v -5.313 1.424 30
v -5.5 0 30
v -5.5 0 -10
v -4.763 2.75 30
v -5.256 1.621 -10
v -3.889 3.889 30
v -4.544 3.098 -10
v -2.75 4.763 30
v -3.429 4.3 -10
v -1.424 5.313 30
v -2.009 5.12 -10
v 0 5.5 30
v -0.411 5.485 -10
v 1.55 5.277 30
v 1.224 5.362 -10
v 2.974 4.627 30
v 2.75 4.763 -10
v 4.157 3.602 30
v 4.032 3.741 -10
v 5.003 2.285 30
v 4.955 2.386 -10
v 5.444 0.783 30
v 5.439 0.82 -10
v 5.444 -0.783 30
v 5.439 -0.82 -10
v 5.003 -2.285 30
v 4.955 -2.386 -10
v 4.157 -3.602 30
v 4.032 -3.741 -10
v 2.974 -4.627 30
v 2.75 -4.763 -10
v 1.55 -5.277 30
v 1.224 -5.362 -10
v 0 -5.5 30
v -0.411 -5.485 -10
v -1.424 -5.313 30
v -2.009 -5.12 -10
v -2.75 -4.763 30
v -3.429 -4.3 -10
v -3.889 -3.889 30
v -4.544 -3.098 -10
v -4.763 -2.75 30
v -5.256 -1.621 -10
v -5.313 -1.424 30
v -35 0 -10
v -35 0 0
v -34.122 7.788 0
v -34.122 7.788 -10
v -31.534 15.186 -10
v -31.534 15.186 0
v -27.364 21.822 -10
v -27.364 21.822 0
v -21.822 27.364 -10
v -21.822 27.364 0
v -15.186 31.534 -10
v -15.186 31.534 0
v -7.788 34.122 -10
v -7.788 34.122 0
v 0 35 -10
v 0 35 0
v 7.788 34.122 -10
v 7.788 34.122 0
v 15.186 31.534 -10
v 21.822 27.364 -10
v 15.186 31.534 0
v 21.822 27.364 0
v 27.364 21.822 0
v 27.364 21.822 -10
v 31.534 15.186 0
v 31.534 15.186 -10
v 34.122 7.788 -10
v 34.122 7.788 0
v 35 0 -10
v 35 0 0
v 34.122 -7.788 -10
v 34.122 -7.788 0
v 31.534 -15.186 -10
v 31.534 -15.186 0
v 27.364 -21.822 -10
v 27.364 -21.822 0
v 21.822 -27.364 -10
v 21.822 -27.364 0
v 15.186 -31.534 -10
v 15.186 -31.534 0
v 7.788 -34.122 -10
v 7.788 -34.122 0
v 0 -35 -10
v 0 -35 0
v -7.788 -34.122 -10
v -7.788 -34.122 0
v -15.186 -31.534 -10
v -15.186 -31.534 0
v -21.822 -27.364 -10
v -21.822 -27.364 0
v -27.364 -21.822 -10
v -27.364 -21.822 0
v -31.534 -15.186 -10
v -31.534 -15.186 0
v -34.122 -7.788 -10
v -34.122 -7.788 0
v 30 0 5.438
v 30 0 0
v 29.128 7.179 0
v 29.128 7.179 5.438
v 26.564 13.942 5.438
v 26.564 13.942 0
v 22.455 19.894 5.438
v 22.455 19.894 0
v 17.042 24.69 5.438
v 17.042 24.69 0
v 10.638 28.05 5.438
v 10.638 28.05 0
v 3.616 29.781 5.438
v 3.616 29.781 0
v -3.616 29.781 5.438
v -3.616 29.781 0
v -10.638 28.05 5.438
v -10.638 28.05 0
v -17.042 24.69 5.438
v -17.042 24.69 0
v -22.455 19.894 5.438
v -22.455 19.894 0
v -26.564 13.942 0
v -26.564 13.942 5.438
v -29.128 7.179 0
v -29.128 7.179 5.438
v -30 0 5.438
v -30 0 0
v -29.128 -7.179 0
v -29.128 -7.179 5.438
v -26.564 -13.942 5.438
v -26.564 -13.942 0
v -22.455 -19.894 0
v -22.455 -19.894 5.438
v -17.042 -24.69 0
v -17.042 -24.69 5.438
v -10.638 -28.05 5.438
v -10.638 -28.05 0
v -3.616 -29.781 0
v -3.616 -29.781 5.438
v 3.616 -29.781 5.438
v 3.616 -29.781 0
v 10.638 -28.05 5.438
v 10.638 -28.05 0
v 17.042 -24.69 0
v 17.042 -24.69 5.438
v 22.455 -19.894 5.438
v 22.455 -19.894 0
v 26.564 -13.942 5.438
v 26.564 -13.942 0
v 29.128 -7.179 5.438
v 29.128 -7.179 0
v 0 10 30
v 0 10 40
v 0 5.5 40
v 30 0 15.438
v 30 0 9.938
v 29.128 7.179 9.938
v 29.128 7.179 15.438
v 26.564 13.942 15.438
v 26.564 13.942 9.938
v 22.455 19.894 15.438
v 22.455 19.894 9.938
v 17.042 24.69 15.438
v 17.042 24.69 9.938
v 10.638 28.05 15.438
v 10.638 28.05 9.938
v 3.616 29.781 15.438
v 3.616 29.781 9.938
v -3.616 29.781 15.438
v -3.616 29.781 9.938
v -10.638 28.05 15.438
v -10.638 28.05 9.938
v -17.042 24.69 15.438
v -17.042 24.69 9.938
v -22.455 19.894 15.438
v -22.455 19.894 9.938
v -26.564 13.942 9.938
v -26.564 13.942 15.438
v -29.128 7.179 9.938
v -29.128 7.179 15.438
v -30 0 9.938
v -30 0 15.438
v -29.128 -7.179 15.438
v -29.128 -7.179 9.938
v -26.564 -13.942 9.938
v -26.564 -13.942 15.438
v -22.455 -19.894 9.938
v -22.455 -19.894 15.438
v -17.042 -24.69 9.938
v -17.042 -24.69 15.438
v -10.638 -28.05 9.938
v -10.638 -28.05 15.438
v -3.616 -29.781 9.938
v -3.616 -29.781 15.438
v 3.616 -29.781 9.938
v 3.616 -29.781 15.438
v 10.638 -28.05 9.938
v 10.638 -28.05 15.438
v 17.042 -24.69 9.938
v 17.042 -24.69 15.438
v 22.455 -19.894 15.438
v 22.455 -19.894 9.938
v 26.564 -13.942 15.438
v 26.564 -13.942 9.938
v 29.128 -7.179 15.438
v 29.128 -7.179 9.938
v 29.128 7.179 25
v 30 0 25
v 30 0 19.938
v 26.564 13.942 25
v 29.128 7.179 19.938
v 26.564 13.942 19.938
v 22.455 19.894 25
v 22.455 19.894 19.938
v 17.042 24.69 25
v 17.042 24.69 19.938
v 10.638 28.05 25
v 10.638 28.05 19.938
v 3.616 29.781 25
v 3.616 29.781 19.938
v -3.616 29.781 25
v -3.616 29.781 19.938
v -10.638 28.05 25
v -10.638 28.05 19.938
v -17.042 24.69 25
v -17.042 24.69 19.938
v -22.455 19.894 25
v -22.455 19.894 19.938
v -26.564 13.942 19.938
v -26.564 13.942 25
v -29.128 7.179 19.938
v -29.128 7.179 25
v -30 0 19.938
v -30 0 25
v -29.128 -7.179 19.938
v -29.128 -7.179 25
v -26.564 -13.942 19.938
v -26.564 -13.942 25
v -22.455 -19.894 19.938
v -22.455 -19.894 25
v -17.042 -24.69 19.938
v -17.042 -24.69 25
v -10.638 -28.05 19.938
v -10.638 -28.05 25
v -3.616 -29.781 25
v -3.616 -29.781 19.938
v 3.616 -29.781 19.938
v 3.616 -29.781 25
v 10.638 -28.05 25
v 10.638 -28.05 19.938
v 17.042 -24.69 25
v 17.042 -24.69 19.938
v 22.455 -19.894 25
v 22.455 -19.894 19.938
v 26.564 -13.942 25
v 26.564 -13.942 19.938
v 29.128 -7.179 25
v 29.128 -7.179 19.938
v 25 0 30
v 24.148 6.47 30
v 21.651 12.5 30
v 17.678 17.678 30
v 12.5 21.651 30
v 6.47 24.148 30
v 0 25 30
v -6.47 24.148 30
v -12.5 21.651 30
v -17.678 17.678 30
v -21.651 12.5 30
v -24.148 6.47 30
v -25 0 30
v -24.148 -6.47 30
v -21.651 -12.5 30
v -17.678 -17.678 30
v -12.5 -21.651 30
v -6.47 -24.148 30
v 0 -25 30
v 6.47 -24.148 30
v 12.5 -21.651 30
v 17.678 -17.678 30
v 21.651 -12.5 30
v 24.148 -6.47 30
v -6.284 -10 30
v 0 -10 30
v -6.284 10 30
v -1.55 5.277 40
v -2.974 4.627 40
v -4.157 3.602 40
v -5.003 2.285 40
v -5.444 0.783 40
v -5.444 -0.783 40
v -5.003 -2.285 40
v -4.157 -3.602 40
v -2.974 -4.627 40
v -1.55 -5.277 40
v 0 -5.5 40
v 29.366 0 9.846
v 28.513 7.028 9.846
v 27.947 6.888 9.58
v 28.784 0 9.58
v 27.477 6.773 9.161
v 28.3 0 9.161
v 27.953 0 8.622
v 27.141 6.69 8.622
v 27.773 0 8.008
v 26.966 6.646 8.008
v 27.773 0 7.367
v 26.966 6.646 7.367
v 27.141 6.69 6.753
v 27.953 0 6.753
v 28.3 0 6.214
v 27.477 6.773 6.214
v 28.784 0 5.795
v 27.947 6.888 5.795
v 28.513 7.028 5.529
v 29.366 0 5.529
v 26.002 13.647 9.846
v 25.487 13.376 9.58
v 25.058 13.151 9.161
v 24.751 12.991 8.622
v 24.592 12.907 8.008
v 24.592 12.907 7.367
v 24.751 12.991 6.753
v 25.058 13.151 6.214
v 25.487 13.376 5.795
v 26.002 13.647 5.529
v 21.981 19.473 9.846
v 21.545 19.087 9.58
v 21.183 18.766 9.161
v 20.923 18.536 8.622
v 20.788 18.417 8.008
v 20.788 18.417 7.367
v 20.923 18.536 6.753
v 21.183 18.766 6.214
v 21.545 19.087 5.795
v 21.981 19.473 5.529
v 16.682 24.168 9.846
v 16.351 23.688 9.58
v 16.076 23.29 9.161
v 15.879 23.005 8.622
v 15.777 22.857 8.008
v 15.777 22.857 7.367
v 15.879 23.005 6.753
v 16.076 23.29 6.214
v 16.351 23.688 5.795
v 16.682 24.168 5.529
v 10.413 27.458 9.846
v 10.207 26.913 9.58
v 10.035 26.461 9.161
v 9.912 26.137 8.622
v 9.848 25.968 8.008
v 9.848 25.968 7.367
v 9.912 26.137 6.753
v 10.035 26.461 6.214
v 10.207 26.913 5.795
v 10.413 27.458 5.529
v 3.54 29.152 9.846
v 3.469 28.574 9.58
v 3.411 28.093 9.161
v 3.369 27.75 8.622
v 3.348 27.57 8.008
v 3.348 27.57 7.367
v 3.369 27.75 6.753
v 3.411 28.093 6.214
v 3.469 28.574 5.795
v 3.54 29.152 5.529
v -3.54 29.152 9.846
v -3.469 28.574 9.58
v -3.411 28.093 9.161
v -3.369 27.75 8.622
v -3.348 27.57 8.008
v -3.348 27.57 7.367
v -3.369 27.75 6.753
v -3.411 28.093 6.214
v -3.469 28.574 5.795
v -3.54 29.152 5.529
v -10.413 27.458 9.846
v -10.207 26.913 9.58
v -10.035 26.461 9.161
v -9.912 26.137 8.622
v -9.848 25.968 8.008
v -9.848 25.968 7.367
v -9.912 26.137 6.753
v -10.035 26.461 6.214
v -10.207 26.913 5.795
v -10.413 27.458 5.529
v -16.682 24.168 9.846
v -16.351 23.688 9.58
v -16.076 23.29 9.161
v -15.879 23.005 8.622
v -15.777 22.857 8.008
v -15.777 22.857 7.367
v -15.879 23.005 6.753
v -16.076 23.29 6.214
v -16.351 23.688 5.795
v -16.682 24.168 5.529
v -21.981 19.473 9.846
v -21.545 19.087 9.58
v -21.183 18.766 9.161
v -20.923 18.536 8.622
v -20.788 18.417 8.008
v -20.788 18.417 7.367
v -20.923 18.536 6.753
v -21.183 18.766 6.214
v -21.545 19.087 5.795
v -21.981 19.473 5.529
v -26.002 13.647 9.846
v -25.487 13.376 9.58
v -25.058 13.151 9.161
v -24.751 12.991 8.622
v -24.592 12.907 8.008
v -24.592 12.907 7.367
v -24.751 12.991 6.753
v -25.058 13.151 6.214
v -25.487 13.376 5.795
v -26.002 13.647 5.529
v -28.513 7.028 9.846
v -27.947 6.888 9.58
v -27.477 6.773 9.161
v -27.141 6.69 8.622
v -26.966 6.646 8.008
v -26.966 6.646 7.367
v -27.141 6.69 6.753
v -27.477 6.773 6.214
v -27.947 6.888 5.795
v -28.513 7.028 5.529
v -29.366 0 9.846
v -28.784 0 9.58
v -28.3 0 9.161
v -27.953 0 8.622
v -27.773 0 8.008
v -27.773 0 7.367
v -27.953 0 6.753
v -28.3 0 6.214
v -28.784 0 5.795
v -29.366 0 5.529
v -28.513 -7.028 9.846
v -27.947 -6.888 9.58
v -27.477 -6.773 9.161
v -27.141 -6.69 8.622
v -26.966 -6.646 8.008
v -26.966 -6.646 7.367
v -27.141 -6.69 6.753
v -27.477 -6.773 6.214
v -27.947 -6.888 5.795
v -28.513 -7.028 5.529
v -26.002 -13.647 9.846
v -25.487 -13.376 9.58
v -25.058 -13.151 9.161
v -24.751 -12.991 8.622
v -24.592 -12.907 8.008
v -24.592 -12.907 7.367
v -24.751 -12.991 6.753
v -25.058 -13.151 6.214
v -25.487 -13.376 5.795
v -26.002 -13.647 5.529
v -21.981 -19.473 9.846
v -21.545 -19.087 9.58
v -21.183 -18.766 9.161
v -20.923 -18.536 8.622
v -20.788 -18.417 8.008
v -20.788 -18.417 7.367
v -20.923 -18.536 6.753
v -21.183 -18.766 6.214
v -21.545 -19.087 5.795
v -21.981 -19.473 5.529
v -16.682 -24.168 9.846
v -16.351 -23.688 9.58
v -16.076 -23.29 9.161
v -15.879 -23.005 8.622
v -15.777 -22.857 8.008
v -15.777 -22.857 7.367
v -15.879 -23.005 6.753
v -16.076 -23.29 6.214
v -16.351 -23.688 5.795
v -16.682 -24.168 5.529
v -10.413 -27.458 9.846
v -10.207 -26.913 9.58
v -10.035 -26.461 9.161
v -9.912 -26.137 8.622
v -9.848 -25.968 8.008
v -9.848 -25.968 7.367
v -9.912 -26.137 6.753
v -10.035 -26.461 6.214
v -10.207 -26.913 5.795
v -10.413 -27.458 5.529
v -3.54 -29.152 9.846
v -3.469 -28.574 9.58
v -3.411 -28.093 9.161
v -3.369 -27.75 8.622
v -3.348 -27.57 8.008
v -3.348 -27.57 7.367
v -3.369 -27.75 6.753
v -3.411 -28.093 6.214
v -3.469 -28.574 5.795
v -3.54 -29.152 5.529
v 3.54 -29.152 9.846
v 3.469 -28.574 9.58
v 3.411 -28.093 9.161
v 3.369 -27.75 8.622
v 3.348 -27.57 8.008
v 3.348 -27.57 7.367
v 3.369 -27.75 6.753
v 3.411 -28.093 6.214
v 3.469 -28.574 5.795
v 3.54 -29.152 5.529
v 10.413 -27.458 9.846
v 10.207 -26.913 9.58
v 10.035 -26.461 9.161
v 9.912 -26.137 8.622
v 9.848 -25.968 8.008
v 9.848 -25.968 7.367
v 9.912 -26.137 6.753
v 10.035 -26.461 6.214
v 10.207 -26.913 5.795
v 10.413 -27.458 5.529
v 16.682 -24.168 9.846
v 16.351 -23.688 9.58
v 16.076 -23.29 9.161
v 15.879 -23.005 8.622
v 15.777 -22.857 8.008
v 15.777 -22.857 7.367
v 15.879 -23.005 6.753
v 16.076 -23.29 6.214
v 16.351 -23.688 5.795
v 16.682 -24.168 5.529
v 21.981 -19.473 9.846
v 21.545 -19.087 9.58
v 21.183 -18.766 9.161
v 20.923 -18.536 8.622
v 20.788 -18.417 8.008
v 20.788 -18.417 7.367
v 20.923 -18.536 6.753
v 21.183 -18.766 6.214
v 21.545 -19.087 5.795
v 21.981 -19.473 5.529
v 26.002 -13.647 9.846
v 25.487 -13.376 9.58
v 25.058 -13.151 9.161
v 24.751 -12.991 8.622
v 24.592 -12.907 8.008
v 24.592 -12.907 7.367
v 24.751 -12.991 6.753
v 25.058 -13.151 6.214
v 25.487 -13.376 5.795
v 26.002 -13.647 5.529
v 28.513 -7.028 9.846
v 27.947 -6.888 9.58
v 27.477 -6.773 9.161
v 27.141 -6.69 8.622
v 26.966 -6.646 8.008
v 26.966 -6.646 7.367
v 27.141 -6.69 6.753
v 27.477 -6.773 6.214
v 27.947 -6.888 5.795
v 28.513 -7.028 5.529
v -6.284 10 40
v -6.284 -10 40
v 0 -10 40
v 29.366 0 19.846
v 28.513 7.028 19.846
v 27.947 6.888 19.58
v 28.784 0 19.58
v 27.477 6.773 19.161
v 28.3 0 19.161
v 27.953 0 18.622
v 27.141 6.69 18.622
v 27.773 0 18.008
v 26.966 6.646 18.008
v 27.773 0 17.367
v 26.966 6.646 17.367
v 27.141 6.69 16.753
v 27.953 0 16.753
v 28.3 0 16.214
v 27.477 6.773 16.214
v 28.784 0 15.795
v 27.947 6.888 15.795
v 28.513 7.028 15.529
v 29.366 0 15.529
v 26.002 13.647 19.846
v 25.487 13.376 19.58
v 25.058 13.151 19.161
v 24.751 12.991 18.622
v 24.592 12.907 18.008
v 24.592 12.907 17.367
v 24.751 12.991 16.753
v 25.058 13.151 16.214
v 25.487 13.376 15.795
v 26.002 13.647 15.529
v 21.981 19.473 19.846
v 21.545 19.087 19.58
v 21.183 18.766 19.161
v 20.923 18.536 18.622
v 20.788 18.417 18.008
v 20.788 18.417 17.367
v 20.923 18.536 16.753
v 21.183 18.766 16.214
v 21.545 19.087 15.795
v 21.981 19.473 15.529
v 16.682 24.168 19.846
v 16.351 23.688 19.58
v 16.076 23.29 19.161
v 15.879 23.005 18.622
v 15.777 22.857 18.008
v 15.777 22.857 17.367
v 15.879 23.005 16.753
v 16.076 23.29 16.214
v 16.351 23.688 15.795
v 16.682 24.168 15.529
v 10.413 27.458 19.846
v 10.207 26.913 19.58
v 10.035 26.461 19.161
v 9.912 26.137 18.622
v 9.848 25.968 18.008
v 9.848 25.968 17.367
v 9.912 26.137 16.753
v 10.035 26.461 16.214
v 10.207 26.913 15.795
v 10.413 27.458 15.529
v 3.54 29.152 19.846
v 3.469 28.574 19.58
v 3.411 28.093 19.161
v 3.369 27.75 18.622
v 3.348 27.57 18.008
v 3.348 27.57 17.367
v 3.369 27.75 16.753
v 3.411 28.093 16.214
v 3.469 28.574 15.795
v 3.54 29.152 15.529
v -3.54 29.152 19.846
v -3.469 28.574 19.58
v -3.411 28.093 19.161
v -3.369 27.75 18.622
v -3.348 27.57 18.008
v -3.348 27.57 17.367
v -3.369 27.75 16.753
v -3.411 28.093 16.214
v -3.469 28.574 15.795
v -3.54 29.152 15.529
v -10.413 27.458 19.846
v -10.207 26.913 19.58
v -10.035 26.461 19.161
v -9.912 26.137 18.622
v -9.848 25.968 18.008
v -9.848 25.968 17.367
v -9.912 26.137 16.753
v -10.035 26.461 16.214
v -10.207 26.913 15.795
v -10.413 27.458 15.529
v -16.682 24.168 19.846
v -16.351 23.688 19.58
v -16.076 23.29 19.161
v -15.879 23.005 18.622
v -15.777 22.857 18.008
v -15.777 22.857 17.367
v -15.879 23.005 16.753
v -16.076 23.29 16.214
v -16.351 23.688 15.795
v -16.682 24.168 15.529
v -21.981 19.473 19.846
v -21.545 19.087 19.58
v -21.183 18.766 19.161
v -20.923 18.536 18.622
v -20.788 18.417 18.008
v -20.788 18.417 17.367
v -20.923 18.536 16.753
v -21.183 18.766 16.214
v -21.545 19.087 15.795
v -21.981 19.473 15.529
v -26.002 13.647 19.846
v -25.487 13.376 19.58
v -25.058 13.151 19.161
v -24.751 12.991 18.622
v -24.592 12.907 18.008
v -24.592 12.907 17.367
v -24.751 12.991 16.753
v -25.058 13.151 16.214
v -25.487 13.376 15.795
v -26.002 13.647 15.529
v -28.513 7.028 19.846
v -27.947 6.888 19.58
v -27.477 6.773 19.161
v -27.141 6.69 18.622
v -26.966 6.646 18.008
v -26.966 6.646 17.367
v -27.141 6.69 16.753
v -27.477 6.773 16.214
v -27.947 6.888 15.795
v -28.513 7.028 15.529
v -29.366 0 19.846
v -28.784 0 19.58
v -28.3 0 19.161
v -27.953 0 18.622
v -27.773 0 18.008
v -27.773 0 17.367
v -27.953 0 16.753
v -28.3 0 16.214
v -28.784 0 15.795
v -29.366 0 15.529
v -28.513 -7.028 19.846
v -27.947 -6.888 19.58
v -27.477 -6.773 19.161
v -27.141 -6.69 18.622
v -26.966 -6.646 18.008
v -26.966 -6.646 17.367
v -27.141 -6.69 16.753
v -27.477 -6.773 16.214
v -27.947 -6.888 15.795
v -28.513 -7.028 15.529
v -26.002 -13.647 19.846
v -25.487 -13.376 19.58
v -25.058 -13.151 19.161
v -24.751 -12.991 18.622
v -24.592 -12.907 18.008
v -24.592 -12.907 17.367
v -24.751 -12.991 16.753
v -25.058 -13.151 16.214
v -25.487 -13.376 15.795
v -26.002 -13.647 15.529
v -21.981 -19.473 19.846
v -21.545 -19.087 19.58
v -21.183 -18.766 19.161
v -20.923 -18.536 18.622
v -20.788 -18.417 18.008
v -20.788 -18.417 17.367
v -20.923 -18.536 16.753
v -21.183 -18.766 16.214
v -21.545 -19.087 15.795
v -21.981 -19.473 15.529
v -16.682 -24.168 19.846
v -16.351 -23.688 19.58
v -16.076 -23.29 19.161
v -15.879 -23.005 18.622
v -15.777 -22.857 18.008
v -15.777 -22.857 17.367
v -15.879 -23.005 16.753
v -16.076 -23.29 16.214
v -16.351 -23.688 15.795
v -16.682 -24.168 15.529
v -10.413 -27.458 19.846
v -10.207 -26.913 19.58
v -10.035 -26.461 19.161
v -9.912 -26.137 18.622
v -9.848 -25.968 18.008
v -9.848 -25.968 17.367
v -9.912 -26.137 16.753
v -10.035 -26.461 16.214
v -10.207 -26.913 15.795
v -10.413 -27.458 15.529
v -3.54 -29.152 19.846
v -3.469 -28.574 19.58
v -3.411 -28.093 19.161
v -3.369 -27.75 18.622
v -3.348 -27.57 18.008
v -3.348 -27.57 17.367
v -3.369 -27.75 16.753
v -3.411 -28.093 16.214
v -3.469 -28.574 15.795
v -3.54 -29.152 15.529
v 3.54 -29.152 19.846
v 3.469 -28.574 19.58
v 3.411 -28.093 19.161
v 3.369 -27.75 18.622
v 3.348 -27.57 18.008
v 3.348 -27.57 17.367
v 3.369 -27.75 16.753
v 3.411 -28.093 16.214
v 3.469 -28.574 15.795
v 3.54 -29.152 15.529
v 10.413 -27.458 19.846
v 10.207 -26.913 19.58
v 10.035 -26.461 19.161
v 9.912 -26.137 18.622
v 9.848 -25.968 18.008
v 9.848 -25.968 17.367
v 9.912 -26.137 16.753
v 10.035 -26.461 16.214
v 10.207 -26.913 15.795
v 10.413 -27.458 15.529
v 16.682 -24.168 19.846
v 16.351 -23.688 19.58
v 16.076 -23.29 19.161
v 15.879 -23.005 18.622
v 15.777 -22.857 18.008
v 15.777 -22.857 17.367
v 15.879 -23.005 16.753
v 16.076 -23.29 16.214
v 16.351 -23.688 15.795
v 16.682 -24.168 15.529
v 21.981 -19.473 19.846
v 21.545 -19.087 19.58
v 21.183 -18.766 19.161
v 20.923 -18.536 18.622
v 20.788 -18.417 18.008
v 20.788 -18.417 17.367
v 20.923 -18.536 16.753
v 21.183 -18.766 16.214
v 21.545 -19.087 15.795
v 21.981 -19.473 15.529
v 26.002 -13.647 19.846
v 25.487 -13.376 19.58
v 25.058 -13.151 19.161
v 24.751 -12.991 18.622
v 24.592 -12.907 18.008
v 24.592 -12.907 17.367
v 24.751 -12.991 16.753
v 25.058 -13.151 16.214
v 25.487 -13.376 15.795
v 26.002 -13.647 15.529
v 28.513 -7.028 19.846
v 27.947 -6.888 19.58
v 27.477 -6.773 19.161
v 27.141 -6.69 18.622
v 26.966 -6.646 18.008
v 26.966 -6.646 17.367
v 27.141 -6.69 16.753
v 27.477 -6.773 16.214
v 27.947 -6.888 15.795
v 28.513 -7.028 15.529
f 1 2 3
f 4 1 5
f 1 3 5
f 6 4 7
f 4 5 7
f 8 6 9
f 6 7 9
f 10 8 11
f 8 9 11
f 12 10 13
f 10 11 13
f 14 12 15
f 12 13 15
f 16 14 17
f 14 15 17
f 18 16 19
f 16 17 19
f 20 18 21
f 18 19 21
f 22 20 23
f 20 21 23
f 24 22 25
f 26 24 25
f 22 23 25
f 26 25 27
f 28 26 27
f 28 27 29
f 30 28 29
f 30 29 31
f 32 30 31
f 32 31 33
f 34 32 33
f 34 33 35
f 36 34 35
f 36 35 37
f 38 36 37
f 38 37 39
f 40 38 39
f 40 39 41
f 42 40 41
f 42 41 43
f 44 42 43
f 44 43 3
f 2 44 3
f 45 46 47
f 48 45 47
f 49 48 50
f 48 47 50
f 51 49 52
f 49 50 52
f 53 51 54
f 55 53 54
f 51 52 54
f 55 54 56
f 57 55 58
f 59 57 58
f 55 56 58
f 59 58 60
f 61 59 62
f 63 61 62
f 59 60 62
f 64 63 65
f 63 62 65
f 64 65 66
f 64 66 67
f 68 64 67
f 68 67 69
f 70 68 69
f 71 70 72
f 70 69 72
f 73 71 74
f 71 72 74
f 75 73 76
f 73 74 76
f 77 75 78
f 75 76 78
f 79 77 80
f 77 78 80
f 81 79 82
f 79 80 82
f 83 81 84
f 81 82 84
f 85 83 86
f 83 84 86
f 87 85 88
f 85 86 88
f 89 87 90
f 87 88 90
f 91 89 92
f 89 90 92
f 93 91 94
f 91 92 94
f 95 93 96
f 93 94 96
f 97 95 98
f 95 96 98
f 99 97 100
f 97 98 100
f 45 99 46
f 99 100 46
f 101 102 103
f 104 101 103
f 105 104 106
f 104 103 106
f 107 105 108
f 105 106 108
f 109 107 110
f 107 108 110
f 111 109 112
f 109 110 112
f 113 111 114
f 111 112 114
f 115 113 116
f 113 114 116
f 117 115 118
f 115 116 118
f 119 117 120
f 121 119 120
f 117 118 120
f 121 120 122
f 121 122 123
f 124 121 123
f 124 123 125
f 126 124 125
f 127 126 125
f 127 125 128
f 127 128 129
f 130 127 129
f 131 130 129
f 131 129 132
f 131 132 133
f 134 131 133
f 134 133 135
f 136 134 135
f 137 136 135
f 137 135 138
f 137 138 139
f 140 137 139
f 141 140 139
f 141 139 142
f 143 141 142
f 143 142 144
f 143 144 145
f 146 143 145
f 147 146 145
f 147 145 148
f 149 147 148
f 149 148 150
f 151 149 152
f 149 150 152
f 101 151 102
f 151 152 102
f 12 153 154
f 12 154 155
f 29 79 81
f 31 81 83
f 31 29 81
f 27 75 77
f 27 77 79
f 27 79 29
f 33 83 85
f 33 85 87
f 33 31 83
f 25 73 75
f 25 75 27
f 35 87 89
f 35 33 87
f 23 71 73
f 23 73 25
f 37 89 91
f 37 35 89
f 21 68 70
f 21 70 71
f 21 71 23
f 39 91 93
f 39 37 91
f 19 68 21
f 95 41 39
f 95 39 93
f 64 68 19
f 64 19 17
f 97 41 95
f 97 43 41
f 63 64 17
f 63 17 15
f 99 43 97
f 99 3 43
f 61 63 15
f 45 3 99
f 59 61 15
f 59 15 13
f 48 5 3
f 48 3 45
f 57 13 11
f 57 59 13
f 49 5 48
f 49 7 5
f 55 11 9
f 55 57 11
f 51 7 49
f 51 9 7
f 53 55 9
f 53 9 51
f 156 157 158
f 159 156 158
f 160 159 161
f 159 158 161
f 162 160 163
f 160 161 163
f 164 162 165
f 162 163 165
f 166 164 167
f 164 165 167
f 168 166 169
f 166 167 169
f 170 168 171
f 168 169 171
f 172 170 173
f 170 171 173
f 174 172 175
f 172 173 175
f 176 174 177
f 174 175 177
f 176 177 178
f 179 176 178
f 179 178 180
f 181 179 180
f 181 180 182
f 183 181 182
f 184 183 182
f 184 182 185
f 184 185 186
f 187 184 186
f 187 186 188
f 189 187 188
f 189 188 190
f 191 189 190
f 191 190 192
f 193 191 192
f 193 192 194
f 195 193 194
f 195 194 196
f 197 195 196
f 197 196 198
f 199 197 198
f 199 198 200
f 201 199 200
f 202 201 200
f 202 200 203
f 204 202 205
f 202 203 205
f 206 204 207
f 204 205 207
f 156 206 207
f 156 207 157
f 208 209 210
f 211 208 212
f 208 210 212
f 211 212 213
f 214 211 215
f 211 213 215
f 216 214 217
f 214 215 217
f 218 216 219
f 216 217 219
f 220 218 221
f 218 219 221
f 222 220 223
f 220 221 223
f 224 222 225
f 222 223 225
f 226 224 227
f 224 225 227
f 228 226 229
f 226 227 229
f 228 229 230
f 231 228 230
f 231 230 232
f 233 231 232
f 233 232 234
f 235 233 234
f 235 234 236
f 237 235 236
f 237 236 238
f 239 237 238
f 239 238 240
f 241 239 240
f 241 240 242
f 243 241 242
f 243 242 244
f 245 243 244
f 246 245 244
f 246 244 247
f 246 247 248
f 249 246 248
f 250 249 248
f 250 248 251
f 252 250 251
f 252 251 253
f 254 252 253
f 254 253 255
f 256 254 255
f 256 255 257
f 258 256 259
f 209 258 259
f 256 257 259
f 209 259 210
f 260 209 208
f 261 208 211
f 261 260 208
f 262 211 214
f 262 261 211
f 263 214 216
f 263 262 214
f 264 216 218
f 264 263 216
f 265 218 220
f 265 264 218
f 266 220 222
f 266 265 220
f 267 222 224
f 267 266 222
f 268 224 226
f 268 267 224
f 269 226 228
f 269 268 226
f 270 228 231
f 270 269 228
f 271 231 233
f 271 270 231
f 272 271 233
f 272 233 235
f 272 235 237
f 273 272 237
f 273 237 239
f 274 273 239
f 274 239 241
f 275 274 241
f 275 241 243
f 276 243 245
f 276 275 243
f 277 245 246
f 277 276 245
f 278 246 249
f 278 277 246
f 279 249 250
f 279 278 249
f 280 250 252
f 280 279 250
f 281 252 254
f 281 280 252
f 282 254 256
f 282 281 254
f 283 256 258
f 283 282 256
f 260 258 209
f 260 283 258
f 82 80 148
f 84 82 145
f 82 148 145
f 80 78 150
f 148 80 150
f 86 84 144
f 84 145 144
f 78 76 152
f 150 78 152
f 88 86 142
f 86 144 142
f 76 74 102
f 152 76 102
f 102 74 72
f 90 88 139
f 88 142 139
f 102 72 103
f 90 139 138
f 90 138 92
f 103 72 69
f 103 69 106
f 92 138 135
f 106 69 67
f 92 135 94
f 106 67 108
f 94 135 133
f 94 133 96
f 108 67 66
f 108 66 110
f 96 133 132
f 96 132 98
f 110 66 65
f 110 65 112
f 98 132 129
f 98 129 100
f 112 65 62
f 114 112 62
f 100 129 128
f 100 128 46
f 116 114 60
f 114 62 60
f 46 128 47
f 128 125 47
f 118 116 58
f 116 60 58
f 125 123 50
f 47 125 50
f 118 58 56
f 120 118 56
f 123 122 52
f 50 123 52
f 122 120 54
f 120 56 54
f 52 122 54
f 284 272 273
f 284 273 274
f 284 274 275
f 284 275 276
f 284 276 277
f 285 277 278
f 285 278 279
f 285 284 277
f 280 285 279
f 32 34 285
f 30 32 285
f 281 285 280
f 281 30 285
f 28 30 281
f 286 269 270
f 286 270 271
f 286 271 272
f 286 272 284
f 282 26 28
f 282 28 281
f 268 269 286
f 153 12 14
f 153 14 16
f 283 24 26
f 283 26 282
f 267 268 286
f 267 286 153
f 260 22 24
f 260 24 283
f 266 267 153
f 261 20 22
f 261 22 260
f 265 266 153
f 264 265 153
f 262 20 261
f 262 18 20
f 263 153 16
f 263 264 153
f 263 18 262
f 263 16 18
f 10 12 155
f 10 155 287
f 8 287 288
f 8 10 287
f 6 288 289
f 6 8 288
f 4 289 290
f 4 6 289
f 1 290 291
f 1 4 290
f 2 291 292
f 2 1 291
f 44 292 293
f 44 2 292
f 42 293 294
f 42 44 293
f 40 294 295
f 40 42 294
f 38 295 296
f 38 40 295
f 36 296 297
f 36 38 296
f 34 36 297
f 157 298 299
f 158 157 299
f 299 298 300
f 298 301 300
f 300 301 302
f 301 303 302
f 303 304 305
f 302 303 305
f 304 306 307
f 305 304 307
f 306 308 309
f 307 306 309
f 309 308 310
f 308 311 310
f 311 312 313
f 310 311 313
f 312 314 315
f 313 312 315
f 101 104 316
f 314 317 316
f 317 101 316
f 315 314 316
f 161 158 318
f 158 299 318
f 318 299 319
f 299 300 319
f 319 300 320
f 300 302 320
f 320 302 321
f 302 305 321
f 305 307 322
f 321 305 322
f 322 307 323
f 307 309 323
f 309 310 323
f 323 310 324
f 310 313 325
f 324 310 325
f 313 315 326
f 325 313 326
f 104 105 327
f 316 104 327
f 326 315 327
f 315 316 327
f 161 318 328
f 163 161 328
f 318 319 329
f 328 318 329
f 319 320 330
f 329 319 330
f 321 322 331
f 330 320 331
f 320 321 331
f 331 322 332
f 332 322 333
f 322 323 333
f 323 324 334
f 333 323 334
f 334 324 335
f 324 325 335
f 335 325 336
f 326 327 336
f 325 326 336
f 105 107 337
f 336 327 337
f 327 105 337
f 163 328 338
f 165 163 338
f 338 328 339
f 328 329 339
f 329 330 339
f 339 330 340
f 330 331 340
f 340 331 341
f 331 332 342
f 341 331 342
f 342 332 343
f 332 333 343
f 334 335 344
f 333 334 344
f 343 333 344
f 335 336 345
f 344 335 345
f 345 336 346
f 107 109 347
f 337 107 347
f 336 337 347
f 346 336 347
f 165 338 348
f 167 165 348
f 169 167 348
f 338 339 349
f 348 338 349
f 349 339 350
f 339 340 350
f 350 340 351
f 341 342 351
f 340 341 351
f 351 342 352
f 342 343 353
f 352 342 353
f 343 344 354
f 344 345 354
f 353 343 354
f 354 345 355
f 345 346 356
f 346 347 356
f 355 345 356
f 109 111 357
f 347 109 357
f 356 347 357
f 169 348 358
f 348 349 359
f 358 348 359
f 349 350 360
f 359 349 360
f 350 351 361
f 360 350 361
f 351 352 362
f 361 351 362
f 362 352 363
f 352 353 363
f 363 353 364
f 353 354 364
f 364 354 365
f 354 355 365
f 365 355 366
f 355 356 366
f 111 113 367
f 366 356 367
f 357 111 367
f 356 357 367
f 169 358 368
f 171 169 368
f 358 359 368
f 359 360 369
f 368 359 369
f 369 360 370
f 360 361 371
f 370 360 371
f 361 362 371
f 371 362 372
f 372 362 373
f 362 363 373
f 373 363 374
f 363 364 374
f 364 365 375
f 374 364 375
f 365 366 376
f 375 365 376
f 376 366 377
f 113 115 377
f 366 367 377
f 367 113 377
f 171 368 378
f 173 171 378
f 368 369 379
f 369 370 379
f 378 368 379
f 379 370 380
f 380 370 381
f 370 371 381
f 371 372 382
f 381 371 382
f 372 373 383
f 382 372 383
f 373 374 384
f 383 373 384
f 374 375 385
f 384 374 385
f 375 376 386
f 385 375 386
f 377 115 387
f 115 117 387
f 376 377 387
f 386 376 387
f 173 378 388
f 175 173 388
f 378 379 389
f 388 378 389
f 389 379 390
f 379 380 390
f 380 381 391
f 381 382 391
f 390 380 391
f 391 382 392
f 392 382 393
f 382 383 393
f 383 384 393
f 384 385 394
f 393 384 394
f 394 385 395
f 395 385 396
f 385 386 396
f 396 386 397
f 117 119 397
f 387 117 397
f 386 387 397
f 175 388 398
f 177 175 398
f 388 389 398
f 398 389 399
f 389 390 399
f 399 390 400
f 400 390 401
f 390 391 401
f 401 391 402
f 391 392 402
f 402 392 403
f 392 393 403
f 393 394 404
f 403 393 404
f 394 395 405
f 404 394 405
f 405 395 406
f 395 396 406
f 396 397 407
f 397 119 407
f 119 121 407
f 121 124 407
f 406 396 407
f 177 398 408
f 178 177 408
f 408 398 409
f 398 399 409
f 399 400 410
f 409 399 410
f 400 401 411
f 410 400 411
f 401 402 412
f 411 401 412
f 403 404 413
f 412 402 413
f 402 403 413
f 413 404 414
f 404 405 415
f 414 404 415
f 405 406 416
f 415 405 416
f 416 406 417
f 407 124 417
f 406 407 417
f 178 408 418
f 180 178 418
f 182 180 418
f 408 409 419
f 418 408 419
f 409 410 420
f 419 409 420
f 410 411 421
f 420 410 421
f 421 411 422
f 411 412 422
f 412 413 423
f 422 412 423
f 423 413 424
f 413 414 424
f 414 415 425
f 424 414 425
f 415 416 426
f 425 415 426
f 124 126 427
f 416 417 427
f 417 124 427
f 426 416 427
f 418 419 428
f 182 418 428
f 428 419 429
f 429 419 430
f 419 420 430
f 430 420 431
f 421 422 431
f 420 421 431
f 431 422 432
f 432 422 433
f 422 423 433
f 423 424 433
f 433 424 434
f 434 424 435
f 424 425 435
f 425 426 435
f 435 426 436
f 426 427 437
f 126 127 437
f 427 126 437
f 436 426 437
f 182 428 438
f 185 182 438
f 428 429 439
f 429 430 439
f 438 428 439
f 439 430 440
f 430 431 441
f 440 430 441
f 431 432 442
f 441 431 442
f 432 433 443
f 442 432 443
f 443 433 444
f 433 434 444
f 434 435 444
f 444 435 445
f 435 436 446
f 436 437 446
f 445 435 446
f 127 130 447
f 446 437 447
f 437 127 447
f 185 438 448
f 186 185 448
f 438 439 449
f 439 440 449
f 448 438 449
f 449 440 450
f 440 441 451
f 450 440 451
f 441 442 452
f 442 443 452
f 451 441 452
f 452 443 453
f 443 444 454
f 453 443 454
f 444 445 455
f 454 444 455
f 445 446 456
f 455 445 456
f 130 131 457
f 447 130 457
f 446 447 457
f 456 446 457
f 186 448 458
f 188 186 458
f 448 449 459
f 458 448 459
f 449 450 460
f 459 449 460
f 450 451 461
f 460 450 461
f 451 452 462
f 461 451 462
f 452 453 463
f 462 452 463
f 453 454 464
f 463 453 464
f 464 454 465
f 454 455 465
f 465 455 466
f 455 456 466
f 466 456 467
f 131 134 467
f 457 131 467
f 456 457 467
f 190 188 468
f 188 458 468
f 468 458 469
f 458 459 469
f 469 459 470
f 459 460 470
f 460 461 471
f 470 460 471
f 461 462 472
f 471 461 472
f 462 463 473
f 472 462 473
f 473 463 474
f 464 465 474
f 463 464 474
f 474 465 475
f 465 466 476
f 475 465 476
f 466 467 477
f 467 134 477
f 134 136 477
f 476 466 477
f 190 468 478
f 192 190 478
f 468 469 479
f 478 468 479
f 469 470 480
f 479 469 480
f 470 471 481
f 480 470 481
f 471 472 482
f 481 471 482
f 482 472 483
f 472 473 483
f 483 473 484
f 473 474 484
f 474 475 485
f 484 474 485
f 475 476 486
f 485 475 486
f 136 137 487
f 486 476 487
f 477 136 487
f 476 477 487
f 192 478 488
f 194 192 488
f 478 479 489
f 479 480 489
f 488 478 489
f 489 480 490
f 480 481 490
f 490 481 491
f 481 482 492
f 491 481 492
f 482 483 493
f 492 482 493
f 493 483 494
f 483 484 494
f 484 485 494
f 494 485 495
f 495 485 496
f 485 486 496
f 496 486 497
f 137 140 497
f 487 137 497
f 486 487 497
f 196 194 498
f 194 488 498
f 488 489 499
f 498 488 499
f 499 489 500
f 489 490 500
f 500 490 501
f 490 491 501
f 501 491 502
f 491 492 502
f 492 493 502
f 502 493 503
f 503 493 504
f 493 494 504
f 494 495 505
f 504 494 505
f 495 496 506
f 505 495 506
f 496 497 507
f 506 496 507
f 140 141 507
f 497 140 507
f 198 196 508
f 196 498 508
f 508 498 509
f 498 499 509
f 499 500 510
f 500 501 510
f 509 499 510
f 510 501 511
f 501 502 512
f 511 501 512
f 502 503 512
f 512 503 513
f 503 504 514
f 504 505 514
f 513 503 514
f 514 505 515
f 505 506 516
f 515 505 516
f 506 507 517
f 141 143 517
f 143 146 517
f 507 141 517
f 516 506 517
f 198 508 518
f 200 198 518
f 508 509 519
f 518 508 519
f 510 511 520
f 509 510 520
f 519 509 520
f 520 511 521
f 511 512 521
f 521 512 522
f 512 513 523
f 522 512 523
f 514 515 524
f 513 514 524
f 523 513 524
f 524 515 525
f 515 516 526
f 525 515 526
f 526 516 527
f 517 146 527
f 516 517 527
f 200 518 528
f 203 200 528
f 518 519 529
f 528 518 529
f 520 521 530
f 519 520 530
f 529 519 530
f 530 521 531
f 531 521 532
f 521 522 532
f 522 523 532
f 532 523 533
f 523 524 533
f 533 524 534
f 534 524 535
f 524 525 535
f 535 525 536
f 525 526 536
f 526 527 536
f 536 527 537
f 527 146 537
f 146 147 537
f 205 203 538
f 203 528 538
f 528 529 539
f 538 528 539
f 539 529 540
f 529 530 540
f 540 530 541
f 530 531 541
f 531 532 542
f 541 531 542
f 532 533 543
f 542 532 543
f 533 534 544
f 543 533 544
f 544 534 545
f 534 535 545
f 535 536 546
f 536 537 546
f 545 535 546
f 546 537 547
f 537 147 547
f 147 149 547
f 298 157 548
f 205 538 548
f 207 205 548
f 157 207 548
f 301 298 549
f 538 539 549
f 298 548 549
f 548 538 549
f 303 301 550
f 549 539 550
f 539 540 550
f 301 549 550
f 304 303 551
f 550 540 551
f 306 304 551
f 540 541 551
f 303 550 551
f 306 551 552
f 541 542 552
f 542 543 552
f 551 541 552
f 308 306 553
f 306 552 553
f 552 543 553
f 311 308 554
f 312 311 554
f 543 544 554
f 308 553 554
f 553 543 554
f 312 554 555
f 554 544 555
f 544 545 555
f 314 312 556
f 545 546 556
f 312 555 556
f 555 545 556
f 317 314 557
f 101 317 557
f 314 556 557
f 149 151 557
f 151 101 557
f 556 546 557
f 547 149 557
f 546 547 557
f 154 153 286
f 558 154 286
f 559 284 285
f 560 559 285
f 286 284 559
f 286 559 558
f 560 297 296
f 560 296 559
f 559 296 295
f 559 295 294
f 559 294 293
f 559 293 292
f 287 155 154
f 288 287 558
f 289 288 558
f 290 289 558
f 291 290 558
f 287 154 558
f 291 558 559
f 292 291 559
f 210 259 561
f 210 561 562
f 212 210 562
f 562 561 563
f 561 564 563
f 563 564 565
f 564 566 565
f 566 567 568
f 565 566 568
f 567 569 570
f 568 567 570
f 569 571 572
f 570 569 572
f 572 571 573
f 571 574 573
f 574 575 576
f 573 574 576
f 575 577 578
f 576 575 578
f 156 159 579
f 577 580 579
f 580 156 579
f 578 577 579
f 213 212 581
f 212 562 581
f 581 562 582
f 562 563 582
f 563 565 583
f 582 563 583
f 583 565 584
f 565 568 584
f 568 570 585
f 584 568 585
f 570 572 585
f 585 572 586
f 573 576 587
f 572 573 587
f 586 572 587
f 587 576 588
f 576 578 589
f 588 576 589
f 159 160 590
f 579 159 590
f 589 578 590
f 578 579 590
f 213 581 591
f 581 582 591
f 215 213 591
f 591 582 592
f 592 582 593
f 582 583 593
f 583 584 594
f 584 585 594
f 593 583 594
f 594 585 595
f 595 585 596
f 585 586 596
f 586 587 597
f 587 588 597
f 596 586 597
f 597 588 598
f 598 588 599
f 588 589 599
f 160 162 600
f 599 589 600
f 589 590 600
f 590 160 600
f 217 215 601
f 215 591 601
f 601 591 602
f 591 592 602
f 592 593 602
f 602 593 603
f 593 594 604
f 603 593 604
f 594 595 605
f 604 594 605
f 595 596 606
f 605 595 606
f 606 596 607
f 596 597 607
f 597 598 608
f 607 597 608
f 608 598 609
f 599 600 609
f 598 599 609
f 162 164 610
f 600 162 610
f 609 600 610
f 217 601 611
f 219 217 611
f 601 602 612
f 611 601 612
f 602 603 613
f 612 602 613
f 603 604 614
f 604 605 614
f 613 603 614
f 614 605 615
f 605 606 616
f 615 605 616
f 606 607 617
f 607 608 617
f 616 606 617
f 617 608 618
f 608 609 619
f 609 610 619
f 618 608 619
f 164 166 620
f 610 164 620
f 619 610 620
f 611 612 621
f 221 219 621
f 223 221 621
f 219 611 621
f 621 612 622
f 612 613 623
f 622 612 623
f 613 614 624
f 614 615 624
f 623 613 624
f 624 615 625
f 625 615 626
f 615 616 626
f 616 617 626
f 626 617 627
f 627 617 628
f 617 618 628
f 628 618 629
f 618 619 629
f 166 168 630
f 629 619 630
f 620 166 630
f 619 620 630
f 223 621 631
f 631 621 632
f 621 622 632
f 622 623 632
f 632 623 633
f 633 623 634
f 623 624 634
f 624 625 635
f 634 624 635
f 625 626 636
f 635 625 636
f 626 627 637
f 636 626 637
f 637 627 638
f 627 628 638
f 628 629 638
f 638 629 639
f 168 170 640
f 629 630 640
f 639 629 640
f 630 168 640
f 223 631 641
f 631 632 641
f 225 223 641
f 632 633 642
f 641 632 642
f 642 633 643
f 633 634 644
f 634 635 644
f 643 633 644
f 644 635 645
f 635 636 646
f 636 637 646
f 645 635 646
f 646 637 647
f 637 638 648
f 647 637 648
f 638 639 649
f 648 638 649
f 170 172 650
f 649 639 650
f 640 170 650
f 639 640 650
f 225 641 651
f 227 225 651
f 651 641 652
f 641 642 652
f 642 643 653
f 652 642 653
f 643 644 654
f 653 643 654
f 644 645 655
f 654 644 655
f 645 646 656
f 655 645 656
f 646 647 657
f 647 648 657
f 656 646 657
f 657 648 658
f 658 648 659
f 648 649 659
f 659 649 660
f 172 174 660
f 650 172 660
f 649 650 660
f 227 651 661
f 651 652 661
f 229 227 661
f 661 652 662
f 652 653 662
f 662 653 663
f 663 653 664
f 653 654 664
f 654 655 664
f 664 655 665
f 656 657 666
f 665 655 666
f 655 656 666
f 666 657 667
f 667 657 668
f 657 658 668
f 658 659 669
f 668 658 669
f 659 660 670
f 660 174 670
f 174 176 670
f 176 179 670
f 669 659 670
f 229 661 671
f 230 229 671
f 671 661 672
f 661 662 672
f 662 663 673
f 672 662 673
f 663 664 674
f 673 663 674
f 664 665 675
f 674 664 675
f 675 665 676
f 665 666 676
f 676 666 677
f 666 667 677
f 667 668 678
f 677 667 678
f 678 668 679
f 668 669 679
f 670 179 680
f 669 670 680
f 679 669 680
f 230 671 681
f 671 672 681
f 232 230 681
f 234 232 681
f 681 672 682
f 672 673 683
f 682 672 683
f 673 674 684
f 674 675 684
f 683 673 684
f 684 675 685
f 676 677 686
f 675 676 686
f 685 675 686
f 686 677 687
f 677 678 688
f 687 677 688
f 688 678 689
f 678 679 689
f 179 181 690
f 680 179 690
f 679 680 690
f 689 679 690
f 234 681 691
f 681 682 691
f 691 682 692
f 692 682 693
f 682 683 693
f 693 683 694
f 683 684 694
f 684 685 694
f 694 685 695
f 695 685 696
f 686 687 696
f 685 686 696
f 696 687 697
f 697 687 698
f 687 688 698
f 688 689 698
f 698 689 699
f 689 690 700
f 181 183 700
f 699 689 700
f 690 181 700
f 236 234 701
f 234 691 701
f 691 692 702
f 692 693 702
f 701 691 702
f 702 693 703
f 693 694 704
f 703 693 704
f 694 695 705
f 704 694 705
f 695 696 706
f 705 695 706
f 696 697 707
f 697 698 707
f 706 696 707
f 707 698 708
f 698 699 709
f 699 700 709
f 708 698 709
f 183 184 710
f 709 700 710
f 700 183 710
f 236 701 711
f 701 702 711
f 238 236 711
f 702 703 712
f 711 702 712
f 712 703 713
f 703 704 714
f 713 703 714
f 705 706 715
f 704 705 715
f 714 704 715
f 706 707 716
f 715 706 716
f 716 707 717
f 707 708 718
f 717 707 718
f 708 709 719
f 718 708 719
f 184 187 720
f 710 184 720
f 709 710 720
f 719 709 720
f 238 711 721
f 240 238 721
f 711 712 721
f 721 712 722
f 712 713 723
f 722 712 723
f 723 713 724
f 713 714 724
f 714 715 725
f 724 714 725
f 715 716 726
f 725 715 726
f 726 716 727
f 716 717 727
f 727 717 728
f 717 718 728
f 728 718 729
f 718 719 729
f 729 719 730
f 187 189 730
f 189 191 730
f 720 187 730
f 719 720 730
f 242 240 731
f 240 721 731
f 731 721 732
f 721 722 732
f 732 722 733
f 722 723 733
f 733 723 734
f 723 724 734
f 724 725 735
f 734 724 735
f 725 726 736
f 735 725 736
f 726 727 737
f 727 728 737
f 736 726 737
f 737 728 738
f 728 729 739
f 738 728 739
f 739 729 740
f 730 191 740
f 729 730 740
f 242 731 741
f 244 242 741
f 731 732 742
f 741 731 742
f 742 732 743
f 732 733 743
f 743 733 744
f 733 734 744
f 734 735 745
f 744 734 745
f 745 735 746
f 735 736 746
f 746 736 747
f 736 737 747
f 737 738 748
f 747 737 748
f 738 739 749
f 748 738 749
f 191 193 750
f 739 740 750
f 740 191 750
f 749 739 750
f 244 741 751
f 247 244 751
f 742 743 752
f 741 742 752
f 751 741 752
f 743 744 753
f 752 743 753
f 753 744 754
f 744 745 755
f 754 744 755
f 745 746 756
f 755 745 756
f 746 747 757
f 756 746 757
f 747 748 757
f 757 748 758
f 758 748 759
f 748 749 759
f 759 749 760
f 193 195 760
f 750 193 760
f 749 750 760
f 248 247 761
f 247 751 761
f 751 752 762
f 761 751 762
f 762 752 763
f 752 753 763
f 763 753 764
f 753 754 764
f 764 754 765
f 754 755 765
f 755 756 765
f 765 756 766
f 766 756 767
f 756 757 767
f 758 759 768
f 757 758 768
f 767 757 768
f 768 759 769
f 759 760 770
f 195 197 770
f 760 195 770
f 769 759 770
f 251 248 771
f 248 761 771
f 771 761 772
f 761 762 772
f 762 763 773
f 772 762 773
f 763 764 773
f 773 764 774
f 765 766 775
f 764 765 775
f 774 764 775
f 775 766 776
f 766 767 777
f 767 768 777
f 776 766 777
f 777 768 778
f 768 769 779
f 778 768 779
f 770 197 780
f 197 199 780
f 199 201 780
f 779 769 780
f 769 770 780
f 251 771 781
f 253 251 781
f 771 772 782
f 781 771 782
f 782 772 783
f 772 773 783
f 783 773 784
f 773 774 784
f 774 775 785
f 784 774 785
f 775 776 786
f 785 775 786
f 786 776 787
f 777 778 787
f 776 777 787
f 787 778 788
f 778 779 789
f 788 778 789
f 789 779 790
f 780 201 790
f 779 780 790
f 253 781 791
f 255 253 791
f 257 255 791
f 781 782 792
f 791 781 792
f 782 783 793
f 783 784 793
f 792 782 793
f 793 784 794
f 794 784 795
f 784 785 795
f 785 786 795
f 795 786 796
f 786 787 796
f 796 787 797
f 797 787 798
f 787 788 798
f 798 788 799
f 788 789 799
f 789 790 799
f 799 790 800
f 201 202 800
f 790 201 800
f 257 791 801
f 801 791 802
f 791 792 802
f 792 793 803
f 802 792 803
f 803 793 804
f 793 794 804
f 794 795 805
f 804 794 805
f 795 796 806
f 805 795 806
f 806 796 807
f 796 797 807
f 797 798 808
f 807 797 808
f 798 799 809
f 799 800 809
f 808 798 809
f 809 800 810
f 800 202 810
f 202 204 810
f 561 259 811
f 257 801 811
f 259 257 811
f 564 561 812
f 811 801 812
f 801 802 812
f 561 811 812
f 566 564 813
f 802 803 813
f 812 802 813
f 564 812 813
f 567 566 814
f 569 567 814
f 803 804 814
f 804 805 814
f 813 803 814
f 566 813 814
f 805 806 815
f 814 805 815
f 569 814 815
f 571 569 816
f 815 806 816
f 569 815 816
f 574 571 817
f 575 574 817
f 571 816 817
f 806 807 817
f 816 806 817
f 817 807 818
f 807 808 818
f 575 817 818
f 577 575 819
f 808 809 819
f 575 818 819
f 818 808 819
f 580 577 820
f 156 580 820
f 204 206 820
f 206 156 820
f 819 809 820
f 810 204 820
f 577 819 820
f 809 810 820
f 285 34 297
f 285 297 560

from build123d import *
from build123d.topology import SkipClean

# Parameters (mm, degrees)
ESQUISSE1_R                = 30
BOSS_EXTRU_1_DEPTH         = 30
ESQUISSE2_R                = 35
BOSS_EXTRU_2_DEPTH         = 10
CHANFREIN1_SIZE            = 5
ESQUISSE3_R                = 5.5
ENL_V_MAT_EXTRU_1_DEPTH    = 40
BOSS_EXTRU_6_DEPTH         = 10
ESQUISSE5_R                = 2.25
R_P_TITION_LIN_AIRE1_COUNT = 2
R_P_TITION_LIN_AIRE1_PITCH = 10


with BuildPart() as part:
    # Esquisse1 → Boss.-Extru.1 (new body)
    with BuildSketch(Plane.XY):
        Circle(ESQUISSE1_R)
    extrude(amount=BOSS_EXTRU_1_DEPTH)

    # Esquisse2 → Boss.-Extru.2 (add)
    with BuildSketch(Plane(origin=(0, 0, 0), x_dir=(-1, 0, 0), z_dir=(0, 0, -1))):
        Circle(ESQUISSE2_R)
    extrude(amount=BOSS_EXTRU_2_DEPTH)

    # Chanfrein1
    chanfrein1_edges = [part.edges().sort_by_distance(p)[0] for p in [
        (-30, 0, 30),
    ]]
    chamfer(chanfrein1_edges, length=CHANFREIN1_SIZE)

    # Esquisse3 → Enlèv. mat.-Extru.1 (cut)
    with BuildSketch(Plane(origin=(0, 0, -10), x_dir=(-1, 0, 0), z_dir=(0, 0, -1))):
        Circle(ESQUISSE3_R)
    extrude(amount=-ENL_V_MAT_EXTRU_1_DEPTH, mode=Mode.SUBTRACT)

    # Esquisse4 → Boss.-Extru.6 (add)
    with SkipClean():  # the faces are left unmerged after this step: merging them gives an invalid solid
        with BuildSketch(Plane.XY.offset(30)):
            with BuildLine():
                Line((0, 10), (0, 5.5))
                ThreePointArc((0, 5.5), (-5.5, 0), (0, -5.5))
                Line((0, -5.5), (0, -10))
                Line((0, -10), (-2.5, -10))
                Line((-2.5, -10), (-3.5, -10))
                Line((-3.5, -10), (-6.284490288, -10))
                Line((-6.284490288, -10), (-6.284490288, 10))
                Line((-6.284490288, 10), (-3.5, 10))
                Line((-3.5, 10), (-2.5, 10))
                Line((-2.5, 10), (0, 10))
            make_face()
        extrude(amount=BOSS_EXTRU_6_DEPTH)
    add(part.part.scale(1), mode=Mode.REPLACE)  # the faces are merged on a copy

    # Enlèvement de matière-Balayage1: sweep along a path in Esquisse6
    with BuildLine(Plane.XY.offset(8)) as enl_vement_de_mati_re_balayage1_path:
        CenterArc((0, 0), 23.00163751, 0, 360)
    # Esquisse5 → Enlèvement de matière-Balayage1 (sweep, cut)
    with BuildSketch(Plane(origin=(0, 0, 0), x_dir=(0, 0, -1), z_dir=(1, 0, 0))):
        with Locations((-7.687500001, -30)):
            Circle(ESQUISSE5_R)
    enl_vement_de_mati_re_balayage1 = sweep(path=enl_vement_de_mati_re_balayage1_path.line, mode=Mode.SUBTRACT)

    # Répétition linéaire1: Enlèvement de matière-Balayage1 ×2
    with Locations(*[(0, 0, i * R_P_TITION_LIN_AIRE1_PITCH) for i in range(1, R_P_TITION_LIN_AIRE1_COUNT)]):
        add(enl_vement_de_mati_re_balayage1, mode=Mode.SUBTRACT)


solid = part.part
